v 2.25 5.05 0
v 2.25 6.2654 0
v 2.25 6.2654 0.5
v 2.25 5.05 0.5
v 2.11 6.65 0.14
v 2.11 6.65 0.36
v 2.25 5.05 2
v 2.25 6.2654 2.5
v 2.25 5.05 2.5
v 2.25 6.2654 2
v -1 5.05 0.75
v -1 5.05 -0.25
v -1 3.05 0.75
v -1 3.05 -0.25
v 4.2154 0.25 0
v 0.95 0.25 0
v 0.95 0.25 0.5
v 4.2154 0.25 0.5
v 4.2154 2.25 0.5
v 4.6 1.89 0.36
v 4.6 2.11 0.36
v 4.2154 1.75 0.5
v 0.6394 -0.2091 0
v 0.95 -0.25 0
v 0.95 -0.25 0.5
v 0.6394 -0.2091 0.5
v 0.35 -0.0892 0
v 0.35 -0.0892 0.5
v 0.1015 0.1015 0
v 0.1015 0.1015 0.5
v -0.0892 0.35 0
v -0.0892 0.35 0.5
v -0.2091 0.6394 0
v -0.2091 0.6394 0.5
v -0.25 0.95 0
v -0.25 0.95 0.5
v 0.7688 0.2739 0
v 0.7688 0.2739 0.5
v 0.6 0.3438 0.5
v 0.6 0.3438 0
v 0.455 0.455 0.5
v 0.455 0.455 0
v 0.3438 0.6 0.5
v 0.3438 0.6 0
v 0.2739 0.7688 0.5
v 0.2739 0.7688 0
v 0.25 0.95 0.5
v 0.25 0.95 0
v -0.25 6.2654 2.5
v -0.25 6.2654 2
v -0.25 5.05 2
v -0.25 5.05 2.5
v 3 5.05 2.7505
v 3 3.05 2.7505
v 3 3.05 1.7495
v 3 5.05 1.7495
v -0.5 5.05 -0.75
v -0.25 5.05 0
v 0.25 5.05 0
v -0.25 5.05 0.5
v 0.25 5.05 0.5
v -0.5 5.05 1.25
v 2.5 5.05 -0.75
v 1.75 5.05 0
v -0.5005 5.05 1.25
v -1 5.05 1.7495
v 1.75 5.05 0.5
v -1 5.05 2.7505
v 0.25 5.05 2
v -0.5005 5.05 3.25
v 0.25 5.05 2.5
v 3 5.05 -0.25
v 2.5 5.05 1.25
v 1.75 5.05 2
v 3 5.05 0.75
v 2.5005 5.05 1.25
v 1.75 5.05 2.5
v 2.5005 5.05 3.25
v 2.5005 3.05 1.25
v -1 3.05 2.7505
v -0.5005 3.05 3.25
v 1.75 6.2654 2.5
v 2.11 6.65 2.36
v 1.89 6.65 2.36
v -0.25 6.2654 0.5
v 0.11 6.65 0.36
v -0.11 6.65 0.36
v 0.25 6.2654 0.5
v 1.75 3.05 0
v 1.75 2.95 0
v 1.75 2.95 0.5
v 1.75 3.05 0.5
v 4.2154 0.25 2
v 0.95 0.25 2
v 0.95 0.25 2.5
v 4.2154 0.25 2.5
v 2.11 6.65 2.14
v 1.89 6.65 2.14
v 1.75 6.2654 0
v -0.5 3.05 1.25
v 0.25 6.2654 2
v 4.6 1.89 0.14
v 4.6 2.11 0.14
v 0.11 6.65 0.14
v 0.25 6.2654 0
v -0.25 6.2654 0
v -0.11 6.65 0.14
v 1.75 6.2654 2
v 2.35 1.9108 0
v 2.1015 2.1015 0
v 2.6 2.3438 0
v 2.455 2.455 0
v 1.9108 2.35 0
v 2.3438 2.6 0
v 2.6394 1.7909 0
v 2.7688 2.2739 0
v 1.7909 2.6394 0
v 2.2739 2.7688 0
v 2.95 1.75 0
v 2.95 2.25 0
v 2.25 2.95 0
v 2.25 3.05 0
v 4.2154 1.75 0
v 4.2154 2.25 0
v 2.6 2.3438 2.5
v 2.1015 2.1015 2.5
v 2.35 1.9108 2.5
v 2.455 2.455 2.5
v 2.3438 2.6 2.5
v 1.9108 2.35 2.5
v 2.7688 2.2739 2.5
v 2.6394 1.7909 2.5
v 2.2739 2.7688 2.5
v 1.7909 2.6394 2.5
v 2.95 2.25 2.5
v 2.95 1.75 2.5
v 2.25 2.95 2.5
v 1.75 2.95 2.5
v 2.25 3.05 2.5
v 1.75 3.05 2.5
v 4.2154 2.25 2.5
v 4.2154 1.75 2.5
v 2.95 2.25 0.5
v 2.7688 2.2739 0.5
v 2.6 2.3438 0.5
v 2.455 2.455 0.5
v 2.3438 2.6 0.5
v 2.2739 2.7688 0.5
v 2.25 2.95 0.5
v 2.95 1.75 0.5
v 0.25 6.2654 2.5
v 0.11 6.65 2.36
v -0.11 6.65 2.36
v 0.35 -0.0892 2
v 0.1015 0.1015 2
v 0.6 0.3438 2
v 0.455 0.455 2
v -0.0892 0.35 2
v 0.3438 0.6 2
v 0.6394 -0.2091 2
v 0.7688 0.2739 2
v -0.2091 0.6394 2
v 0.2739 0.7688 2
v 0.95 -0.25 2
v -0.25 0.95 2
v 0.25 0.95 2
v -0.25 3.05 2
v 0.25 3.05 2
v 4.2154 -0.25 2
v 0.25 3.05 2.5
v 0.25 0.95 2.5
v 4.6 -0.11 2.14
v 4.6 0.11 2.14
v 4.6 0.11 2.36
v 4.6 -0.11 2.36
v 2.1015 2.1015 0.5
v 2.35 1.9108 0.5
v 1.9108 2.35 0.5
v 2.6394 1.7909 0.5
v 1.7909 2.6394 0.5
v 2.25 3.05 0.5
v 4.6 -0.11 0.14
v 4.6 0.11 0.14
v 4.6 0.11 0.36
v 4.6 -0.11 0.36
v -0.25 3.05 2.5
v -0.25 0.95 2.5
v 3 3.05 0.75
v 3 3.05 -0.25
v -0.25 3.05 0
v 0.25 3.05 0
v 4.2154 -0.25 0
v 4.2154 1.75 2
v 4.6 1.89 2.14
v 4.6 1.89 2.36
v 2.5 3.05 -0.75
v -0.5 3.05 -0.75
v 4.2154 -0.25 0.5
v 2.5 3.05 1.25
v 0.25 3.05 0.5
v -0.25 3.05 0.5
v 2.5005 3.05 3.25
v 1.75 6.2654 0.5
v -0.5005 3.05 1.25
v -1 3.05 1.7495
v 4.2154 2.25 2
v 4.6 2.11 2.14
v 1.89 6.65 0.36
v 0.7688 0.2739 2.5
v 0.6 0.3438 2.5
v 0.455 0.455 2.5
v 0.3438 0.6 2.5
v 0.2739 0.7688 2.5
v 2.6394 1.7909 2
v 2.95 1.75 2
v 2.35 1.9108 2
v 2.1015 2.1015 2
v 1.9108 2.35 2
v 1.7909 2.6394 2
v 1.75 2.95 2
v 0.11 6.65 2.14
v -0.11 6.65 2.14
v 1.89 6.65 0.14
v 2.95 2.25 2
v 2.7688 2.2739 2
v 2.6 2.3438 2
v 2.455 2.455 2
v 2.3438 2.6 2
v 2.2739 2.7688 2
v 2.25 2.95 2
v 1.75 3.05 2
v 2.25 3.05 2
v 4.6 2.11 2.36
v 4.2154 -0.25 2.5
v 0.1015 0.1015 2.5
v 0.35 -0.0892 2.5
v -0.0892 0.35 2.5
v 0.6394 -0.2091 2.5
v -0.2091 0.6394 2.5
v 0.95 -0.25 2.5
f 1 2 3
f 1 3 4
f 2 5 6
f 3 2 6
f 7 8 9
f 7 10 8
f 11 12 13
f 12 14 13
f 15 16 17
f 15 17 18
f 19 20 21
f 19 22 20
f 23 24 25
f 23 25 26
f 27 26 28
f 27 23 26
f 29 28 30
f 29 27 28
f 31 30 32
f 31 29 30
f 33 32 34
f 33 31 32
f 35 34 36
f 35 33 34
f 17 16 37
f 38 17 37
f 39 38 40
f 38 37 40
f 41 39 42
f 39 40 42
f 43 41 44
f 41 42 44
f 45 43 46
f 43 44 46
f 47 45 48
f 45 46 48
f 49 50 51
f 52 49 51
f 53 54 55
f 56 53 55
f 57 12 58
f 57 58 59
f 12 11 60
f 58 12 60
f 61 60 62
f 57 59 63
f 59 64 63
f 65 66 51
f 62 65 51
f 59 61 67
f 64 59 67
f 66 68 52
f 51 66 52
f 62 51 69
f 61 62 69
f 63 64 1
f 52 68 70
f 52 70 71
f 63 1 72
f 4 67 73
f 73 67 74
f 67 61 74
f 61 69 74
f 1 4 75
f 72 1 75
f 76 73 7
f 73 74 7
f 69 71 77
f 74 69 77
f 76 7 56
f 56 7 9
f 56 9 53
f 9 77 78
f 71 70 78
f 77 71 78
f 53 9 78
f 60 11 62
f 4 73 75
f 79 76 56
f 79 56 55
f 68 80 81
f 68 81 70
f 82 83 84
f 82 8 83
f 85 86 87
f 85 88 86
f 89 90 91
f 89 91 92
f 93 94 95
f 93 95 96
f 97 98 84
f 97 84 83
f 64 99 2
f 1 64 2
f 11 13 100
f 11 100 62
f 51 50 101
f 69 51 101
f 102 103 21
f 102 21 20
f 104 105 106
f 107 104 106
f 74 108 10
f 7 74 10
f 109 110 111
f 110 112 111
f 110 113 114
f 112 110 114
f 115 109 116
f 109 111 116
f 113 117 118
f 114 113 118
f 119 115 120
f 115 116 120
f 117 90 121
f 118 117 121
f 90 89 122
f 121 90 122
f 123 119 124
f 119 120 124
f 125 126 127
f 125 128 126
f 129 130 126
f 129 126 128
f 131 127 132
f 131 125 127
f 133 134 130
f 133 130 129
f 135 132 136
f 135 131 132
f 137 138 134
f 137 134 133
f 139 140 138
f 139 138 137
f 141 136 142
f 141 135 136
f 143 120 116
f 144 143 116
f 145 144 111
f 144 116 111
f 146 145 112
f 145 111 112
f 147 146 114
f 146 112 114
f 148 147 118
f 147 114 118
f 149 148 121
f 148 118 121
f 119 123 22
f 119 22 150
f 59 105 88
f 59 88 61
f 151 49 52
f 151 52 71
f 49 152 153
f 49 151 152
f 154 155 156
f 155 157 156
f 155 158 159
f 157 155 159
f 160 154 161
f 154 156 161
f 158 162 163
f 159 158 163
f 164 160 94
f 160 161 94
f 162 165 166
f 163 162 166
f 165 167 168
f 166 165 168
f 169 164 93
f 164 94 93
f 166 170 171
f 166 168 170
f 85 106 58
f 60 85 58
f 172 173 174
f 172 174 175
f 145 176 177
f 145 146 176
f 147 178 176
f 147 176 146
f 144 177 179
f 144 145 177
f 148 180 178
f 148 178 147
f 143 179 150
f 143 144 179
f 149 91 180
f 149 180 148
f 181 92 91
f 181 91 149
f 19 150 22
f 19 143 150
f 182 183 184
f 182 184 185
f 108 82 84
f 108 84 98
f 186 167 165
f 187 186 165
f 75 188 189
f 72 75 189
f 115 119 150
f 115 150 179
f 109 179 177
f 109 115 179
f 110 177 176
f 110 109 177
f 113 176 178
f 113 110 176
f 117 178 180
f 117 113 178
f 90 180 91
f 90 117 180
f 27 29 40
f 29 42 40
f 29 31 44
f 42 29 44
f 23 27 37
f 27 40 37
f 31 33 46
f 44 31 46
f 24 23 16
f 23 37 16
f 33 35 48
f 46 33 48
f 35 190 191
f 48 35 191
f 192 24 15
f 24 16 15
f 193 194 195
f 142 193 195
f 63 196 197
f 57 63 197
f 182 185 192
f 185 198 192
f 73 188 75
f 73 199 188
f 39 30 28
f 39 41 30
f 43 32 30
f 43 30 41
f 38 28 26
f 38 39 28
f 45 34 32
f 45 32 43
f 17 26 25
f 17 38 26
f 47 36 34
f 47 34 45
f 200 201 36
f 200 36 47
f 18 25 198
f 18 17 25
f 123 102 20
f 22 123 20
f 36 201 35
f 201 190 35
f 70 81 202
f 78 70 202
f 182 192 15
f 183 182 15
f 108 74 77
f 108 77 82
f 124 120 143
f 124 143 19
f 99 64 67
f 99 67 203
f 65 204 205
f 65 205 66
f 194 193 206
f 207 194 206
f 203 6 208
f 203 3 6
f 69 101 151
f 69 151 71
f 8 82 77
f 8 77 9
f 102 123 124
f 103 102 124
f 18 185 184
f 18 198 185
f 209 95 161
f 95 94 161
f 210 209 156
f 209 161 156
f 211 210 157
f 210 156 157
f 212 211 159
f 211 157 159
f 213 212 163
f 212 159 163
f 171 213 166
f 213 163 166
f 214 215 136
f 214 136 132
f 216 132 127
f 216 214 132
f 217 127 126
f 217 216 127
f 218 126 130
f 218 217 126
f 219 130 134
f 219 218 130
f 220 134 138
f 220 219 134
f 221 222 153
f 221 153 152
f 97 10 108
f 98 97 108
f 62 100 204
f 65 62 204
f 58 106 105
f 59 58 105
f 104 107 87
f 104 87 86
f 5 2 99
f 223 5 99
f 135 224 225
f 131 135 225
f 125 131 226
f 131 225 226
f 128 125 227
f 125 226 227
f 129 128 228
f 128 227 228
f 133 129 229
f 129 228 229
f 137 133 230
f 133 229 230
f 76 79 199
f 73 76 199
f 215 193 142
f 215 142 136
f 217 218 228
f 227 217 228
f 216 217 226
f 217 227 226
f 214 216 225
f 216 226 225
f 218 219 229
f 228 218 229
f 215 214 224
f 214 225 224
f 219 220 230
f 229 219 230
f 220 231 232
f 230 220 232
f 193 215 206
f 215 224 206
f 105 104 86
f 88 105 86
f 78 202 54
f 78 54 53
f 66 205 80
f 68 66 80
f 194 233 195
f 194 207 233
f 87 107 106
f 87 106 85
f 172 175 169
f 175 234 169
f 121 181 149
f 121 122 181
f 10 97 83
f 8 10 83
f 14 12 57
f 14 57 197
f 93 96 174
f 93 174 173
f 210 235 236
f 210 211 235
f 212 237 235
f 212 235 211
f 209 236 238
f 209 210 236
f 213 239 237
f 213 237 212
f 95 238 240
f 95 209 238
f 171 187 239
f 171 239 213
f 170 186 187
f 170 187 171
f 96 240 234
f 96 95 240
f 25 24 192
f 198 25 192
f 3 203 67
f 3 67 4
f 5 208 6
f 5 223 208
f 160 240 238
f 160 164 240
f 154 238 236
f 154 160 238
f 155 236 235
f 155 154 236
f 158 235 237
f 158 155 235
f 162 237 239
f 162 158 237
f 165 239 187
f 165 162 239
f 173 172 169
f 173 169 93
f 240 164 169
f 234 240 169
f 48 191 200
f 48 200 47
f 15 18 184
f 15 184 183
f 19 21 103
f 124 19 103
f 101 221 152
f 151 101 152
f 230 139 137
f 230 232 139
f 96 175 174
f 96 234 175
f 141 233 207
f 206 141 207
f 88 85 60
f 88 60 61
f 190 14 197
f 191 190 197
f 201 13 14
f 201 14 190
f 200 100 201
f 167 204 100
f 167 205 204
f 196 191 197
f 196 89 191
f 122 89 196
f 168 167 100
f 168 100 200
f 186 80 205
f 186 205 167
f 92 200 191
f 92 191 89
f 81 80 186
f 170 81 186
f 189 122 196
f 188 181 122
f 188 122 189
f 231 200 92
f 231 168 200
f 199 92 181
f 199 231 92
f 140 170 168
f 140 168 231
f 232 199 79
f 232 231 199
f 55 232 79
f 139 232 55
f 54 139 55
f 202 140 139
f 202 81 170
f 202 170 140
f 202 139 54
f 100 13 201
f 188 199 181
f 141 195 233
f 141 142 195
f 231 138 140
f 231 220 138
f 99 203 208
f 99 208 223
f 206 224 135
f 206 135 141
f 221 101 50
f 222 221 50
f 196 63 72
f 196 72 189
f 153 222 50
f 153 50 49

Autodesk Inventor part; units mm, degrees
ref_plane "YZ Plane" through (0, 0, 0) normal (1, 0, 0) x (0, 1, 0)
ref_plane "XZ Plane" through (0, 0, 0) normal (0, 1, 0) x (-1, 0, 0)
sketch "스케치1" plane through (0, 0, 0) normal (0, 0, 1) x (1, 0, 0)
  line L0 (4.6, 1.75) -> (2.95, 1.75)
  line L1 (1.75, 2.95) -> (1.75, 6.65)
  line L2 (-0.25, 6.65) -> (-0.25, 0.95)
  line L3 (0.95, -0.25) -> (4.6, -0.25)
  arc A0 (-0.25, 0.95) -> (0.95, -0.25) centre (0.95, 0.95) ccw
  line L4 (0.25, 6.65) -> (0.25, 0.95)
  arc A1 (0.25, 0.95) -> (0.95, 0.25) centre (0.95, 0.95) ccw
  line L5 (0.95, 0.25) -> (4.6, 0.25)
  arc A2 (1.75, 2.95) -> (2.95, 1.75) centre (2.95, 2.95) ccw
  line L6 (2.25, 6.65) -> (2.25, 2.95)
  arc A3 (2.25, 2.95) -> (2.95, 2.25) centre (2.95, 2.95) ccw
  line L7 (2.95, 2.25) -> (4.6, 2.25)
  line L8 (-0.25, 6.65) -> (0.25, 6.65)
  line L9 (1.75, 6.65) -> (2.25, 6.65)
  line L10 (4.6, 2.25) -> (4.6, 1.75)
  line L11 (4.6, 0.25) -> (4.6, -0.25)
  point P0 (0, 0)
  point P1 (1.75, 1.75)
  point P2 (-0.25, -0.25)
  dimension "d12" = 1.2
  dimension "d13" = 0.5
  dimension "d14" = 1.2
  dimension "d15" = 0.5
extrude "돌출1" add sketch "스케치1" along normal blind 0.5
ref_plane "작업 평면1" through (0.95, 3.05, 0) normal (0, -1, 0) x (1, 0, 0)
sketch "스케치2" plane through (0.95, 3.05, 0) normal (0, -1, 0) x (1, 0, 0)
  line L0 (-1.2, 0) -> (0, 0) projected
  line L1 (0, 0) -> (0, 0.5) projected
  line L2 (-1.2, 0.5) -> (0, 0.5) projected
  line L3 (-1.2, 0) -> (-1.2, 0.5) projected
  line L4 (0, 0.5) -> (3.65, 0.5) projected
  line L5 (0, 0) -> (0, 0.5) projected
  line L6 (0, 0) -> (3.65, 0) projected
  line L7 (0.94, 0.14) -> (1.16, 0.14) projected
  line L8 (0.94, 0.36) -> (0.94, 0.14) projected
  line L9 (1.16, 0.36) -> (0.94, 0.36) projected
  line L10 (1.16, 0.14) -> (1.16, 0.36) projected
  line L11 (-0.7, 0) -> (-1.2, 0) projected
  line L12 (-1.2, 0) -> (1.3, 0)
  line L13 (1.3, 0) -> (1.3, 0.5)
  line L14 (1.3, 0.5) -> (-1.2, 0.5)
  line L15 (-1.2, 0.5) -> (-1.2, 0)
  line L16 (-1.95, 1.25) -> (2.05, 1.25)
  line L17 (2.05, 1.25) -> (2.05, -0.75)
  line L18 (2.05, -0.75) -> (-1.95, -0.75)
  line L19 (-1.95, -0.75) -> (-1.95, 1.25)
  line L20 (-0.7, 0) -> (-0.7, 0.5) projected
  line L21 (-1.2, 0) -> (-1.2, 0.5) projected
  line L22 (-0.7, 0) -> (-1.2, 0) projected
  line L23 (-0.7, 0.5) -> (-1.2, 0.5) projected
  line L24 (3.65, 0) -> (3.65, 0.5) projected
  point P0 (-0.95, 0)
  dimension "d36" = 0.75
extrude "돌출2" add sketch "스케치2" against normal blind 2 contours L3 L2 L20 L0 | L0 L6 L17 L18 L19 L16 L4 L2 L3 | L20 L2 L1 L0 | L1 L4 L13 L6 | L13 L4 L17 L6 | L8 L9 L10 L7
chamfer "모따기7" distance 0.14 angle 70 4 edges at (0, 6.65, 0.5) (-0.25, 6.65, 0.25) (0, 6.65, 0) (0.25, 6.65, 0.25) measured on face at (0.0833, 6.65, 0.1667)
chamfer "모따기8" distance 0.14 angle 70 4 edges at (1.75, 6.65, 0.25) (2, 6.65, 0) (2.25, 6.65, 0.25) (2, 6.65, 0.5) measured on face at (2.0833, 6.65, 0.1667)
chamfer "모따기9" distance 0.14 angle 70 4 edges at (4.6, 2, 0.5) (4.6, 2.25, 0.25) (4.6, 2, 0) (4.6, 1.75, 0.25) measured on face at (4.6, 1.9167, 0.1667)
chamfer "모따기10" distance 0.14 angle 70 4 edges at (4.6, 0.25, 0.25) (4.6, 0, 0.5) (4.6, 0, 0) (4.6, -0.25, 0.25) measured on face at (4.6, -0.0833, 0.1667)
chamfer "모따기11" distance 0.5 angle 45 4 edges at (-1, 4.05, 1.25) (3, 4.05, 1.25) (3, 4.05, -0.75) (-1, 4.05, -0.75)
pattern_linear "직사각형 패턴1" count 2 spacing 2 along (0, 0, 1) of "돌출1", "돌출2", "모따기7", "모따기8", "모따기9", "모따기10", "모따기11"
ref_plane "작업 평면2" through (0.95, 3.05, 2) normal (0, -1, 0) x (1, 0, 0)
properties part number "2pin_header"
